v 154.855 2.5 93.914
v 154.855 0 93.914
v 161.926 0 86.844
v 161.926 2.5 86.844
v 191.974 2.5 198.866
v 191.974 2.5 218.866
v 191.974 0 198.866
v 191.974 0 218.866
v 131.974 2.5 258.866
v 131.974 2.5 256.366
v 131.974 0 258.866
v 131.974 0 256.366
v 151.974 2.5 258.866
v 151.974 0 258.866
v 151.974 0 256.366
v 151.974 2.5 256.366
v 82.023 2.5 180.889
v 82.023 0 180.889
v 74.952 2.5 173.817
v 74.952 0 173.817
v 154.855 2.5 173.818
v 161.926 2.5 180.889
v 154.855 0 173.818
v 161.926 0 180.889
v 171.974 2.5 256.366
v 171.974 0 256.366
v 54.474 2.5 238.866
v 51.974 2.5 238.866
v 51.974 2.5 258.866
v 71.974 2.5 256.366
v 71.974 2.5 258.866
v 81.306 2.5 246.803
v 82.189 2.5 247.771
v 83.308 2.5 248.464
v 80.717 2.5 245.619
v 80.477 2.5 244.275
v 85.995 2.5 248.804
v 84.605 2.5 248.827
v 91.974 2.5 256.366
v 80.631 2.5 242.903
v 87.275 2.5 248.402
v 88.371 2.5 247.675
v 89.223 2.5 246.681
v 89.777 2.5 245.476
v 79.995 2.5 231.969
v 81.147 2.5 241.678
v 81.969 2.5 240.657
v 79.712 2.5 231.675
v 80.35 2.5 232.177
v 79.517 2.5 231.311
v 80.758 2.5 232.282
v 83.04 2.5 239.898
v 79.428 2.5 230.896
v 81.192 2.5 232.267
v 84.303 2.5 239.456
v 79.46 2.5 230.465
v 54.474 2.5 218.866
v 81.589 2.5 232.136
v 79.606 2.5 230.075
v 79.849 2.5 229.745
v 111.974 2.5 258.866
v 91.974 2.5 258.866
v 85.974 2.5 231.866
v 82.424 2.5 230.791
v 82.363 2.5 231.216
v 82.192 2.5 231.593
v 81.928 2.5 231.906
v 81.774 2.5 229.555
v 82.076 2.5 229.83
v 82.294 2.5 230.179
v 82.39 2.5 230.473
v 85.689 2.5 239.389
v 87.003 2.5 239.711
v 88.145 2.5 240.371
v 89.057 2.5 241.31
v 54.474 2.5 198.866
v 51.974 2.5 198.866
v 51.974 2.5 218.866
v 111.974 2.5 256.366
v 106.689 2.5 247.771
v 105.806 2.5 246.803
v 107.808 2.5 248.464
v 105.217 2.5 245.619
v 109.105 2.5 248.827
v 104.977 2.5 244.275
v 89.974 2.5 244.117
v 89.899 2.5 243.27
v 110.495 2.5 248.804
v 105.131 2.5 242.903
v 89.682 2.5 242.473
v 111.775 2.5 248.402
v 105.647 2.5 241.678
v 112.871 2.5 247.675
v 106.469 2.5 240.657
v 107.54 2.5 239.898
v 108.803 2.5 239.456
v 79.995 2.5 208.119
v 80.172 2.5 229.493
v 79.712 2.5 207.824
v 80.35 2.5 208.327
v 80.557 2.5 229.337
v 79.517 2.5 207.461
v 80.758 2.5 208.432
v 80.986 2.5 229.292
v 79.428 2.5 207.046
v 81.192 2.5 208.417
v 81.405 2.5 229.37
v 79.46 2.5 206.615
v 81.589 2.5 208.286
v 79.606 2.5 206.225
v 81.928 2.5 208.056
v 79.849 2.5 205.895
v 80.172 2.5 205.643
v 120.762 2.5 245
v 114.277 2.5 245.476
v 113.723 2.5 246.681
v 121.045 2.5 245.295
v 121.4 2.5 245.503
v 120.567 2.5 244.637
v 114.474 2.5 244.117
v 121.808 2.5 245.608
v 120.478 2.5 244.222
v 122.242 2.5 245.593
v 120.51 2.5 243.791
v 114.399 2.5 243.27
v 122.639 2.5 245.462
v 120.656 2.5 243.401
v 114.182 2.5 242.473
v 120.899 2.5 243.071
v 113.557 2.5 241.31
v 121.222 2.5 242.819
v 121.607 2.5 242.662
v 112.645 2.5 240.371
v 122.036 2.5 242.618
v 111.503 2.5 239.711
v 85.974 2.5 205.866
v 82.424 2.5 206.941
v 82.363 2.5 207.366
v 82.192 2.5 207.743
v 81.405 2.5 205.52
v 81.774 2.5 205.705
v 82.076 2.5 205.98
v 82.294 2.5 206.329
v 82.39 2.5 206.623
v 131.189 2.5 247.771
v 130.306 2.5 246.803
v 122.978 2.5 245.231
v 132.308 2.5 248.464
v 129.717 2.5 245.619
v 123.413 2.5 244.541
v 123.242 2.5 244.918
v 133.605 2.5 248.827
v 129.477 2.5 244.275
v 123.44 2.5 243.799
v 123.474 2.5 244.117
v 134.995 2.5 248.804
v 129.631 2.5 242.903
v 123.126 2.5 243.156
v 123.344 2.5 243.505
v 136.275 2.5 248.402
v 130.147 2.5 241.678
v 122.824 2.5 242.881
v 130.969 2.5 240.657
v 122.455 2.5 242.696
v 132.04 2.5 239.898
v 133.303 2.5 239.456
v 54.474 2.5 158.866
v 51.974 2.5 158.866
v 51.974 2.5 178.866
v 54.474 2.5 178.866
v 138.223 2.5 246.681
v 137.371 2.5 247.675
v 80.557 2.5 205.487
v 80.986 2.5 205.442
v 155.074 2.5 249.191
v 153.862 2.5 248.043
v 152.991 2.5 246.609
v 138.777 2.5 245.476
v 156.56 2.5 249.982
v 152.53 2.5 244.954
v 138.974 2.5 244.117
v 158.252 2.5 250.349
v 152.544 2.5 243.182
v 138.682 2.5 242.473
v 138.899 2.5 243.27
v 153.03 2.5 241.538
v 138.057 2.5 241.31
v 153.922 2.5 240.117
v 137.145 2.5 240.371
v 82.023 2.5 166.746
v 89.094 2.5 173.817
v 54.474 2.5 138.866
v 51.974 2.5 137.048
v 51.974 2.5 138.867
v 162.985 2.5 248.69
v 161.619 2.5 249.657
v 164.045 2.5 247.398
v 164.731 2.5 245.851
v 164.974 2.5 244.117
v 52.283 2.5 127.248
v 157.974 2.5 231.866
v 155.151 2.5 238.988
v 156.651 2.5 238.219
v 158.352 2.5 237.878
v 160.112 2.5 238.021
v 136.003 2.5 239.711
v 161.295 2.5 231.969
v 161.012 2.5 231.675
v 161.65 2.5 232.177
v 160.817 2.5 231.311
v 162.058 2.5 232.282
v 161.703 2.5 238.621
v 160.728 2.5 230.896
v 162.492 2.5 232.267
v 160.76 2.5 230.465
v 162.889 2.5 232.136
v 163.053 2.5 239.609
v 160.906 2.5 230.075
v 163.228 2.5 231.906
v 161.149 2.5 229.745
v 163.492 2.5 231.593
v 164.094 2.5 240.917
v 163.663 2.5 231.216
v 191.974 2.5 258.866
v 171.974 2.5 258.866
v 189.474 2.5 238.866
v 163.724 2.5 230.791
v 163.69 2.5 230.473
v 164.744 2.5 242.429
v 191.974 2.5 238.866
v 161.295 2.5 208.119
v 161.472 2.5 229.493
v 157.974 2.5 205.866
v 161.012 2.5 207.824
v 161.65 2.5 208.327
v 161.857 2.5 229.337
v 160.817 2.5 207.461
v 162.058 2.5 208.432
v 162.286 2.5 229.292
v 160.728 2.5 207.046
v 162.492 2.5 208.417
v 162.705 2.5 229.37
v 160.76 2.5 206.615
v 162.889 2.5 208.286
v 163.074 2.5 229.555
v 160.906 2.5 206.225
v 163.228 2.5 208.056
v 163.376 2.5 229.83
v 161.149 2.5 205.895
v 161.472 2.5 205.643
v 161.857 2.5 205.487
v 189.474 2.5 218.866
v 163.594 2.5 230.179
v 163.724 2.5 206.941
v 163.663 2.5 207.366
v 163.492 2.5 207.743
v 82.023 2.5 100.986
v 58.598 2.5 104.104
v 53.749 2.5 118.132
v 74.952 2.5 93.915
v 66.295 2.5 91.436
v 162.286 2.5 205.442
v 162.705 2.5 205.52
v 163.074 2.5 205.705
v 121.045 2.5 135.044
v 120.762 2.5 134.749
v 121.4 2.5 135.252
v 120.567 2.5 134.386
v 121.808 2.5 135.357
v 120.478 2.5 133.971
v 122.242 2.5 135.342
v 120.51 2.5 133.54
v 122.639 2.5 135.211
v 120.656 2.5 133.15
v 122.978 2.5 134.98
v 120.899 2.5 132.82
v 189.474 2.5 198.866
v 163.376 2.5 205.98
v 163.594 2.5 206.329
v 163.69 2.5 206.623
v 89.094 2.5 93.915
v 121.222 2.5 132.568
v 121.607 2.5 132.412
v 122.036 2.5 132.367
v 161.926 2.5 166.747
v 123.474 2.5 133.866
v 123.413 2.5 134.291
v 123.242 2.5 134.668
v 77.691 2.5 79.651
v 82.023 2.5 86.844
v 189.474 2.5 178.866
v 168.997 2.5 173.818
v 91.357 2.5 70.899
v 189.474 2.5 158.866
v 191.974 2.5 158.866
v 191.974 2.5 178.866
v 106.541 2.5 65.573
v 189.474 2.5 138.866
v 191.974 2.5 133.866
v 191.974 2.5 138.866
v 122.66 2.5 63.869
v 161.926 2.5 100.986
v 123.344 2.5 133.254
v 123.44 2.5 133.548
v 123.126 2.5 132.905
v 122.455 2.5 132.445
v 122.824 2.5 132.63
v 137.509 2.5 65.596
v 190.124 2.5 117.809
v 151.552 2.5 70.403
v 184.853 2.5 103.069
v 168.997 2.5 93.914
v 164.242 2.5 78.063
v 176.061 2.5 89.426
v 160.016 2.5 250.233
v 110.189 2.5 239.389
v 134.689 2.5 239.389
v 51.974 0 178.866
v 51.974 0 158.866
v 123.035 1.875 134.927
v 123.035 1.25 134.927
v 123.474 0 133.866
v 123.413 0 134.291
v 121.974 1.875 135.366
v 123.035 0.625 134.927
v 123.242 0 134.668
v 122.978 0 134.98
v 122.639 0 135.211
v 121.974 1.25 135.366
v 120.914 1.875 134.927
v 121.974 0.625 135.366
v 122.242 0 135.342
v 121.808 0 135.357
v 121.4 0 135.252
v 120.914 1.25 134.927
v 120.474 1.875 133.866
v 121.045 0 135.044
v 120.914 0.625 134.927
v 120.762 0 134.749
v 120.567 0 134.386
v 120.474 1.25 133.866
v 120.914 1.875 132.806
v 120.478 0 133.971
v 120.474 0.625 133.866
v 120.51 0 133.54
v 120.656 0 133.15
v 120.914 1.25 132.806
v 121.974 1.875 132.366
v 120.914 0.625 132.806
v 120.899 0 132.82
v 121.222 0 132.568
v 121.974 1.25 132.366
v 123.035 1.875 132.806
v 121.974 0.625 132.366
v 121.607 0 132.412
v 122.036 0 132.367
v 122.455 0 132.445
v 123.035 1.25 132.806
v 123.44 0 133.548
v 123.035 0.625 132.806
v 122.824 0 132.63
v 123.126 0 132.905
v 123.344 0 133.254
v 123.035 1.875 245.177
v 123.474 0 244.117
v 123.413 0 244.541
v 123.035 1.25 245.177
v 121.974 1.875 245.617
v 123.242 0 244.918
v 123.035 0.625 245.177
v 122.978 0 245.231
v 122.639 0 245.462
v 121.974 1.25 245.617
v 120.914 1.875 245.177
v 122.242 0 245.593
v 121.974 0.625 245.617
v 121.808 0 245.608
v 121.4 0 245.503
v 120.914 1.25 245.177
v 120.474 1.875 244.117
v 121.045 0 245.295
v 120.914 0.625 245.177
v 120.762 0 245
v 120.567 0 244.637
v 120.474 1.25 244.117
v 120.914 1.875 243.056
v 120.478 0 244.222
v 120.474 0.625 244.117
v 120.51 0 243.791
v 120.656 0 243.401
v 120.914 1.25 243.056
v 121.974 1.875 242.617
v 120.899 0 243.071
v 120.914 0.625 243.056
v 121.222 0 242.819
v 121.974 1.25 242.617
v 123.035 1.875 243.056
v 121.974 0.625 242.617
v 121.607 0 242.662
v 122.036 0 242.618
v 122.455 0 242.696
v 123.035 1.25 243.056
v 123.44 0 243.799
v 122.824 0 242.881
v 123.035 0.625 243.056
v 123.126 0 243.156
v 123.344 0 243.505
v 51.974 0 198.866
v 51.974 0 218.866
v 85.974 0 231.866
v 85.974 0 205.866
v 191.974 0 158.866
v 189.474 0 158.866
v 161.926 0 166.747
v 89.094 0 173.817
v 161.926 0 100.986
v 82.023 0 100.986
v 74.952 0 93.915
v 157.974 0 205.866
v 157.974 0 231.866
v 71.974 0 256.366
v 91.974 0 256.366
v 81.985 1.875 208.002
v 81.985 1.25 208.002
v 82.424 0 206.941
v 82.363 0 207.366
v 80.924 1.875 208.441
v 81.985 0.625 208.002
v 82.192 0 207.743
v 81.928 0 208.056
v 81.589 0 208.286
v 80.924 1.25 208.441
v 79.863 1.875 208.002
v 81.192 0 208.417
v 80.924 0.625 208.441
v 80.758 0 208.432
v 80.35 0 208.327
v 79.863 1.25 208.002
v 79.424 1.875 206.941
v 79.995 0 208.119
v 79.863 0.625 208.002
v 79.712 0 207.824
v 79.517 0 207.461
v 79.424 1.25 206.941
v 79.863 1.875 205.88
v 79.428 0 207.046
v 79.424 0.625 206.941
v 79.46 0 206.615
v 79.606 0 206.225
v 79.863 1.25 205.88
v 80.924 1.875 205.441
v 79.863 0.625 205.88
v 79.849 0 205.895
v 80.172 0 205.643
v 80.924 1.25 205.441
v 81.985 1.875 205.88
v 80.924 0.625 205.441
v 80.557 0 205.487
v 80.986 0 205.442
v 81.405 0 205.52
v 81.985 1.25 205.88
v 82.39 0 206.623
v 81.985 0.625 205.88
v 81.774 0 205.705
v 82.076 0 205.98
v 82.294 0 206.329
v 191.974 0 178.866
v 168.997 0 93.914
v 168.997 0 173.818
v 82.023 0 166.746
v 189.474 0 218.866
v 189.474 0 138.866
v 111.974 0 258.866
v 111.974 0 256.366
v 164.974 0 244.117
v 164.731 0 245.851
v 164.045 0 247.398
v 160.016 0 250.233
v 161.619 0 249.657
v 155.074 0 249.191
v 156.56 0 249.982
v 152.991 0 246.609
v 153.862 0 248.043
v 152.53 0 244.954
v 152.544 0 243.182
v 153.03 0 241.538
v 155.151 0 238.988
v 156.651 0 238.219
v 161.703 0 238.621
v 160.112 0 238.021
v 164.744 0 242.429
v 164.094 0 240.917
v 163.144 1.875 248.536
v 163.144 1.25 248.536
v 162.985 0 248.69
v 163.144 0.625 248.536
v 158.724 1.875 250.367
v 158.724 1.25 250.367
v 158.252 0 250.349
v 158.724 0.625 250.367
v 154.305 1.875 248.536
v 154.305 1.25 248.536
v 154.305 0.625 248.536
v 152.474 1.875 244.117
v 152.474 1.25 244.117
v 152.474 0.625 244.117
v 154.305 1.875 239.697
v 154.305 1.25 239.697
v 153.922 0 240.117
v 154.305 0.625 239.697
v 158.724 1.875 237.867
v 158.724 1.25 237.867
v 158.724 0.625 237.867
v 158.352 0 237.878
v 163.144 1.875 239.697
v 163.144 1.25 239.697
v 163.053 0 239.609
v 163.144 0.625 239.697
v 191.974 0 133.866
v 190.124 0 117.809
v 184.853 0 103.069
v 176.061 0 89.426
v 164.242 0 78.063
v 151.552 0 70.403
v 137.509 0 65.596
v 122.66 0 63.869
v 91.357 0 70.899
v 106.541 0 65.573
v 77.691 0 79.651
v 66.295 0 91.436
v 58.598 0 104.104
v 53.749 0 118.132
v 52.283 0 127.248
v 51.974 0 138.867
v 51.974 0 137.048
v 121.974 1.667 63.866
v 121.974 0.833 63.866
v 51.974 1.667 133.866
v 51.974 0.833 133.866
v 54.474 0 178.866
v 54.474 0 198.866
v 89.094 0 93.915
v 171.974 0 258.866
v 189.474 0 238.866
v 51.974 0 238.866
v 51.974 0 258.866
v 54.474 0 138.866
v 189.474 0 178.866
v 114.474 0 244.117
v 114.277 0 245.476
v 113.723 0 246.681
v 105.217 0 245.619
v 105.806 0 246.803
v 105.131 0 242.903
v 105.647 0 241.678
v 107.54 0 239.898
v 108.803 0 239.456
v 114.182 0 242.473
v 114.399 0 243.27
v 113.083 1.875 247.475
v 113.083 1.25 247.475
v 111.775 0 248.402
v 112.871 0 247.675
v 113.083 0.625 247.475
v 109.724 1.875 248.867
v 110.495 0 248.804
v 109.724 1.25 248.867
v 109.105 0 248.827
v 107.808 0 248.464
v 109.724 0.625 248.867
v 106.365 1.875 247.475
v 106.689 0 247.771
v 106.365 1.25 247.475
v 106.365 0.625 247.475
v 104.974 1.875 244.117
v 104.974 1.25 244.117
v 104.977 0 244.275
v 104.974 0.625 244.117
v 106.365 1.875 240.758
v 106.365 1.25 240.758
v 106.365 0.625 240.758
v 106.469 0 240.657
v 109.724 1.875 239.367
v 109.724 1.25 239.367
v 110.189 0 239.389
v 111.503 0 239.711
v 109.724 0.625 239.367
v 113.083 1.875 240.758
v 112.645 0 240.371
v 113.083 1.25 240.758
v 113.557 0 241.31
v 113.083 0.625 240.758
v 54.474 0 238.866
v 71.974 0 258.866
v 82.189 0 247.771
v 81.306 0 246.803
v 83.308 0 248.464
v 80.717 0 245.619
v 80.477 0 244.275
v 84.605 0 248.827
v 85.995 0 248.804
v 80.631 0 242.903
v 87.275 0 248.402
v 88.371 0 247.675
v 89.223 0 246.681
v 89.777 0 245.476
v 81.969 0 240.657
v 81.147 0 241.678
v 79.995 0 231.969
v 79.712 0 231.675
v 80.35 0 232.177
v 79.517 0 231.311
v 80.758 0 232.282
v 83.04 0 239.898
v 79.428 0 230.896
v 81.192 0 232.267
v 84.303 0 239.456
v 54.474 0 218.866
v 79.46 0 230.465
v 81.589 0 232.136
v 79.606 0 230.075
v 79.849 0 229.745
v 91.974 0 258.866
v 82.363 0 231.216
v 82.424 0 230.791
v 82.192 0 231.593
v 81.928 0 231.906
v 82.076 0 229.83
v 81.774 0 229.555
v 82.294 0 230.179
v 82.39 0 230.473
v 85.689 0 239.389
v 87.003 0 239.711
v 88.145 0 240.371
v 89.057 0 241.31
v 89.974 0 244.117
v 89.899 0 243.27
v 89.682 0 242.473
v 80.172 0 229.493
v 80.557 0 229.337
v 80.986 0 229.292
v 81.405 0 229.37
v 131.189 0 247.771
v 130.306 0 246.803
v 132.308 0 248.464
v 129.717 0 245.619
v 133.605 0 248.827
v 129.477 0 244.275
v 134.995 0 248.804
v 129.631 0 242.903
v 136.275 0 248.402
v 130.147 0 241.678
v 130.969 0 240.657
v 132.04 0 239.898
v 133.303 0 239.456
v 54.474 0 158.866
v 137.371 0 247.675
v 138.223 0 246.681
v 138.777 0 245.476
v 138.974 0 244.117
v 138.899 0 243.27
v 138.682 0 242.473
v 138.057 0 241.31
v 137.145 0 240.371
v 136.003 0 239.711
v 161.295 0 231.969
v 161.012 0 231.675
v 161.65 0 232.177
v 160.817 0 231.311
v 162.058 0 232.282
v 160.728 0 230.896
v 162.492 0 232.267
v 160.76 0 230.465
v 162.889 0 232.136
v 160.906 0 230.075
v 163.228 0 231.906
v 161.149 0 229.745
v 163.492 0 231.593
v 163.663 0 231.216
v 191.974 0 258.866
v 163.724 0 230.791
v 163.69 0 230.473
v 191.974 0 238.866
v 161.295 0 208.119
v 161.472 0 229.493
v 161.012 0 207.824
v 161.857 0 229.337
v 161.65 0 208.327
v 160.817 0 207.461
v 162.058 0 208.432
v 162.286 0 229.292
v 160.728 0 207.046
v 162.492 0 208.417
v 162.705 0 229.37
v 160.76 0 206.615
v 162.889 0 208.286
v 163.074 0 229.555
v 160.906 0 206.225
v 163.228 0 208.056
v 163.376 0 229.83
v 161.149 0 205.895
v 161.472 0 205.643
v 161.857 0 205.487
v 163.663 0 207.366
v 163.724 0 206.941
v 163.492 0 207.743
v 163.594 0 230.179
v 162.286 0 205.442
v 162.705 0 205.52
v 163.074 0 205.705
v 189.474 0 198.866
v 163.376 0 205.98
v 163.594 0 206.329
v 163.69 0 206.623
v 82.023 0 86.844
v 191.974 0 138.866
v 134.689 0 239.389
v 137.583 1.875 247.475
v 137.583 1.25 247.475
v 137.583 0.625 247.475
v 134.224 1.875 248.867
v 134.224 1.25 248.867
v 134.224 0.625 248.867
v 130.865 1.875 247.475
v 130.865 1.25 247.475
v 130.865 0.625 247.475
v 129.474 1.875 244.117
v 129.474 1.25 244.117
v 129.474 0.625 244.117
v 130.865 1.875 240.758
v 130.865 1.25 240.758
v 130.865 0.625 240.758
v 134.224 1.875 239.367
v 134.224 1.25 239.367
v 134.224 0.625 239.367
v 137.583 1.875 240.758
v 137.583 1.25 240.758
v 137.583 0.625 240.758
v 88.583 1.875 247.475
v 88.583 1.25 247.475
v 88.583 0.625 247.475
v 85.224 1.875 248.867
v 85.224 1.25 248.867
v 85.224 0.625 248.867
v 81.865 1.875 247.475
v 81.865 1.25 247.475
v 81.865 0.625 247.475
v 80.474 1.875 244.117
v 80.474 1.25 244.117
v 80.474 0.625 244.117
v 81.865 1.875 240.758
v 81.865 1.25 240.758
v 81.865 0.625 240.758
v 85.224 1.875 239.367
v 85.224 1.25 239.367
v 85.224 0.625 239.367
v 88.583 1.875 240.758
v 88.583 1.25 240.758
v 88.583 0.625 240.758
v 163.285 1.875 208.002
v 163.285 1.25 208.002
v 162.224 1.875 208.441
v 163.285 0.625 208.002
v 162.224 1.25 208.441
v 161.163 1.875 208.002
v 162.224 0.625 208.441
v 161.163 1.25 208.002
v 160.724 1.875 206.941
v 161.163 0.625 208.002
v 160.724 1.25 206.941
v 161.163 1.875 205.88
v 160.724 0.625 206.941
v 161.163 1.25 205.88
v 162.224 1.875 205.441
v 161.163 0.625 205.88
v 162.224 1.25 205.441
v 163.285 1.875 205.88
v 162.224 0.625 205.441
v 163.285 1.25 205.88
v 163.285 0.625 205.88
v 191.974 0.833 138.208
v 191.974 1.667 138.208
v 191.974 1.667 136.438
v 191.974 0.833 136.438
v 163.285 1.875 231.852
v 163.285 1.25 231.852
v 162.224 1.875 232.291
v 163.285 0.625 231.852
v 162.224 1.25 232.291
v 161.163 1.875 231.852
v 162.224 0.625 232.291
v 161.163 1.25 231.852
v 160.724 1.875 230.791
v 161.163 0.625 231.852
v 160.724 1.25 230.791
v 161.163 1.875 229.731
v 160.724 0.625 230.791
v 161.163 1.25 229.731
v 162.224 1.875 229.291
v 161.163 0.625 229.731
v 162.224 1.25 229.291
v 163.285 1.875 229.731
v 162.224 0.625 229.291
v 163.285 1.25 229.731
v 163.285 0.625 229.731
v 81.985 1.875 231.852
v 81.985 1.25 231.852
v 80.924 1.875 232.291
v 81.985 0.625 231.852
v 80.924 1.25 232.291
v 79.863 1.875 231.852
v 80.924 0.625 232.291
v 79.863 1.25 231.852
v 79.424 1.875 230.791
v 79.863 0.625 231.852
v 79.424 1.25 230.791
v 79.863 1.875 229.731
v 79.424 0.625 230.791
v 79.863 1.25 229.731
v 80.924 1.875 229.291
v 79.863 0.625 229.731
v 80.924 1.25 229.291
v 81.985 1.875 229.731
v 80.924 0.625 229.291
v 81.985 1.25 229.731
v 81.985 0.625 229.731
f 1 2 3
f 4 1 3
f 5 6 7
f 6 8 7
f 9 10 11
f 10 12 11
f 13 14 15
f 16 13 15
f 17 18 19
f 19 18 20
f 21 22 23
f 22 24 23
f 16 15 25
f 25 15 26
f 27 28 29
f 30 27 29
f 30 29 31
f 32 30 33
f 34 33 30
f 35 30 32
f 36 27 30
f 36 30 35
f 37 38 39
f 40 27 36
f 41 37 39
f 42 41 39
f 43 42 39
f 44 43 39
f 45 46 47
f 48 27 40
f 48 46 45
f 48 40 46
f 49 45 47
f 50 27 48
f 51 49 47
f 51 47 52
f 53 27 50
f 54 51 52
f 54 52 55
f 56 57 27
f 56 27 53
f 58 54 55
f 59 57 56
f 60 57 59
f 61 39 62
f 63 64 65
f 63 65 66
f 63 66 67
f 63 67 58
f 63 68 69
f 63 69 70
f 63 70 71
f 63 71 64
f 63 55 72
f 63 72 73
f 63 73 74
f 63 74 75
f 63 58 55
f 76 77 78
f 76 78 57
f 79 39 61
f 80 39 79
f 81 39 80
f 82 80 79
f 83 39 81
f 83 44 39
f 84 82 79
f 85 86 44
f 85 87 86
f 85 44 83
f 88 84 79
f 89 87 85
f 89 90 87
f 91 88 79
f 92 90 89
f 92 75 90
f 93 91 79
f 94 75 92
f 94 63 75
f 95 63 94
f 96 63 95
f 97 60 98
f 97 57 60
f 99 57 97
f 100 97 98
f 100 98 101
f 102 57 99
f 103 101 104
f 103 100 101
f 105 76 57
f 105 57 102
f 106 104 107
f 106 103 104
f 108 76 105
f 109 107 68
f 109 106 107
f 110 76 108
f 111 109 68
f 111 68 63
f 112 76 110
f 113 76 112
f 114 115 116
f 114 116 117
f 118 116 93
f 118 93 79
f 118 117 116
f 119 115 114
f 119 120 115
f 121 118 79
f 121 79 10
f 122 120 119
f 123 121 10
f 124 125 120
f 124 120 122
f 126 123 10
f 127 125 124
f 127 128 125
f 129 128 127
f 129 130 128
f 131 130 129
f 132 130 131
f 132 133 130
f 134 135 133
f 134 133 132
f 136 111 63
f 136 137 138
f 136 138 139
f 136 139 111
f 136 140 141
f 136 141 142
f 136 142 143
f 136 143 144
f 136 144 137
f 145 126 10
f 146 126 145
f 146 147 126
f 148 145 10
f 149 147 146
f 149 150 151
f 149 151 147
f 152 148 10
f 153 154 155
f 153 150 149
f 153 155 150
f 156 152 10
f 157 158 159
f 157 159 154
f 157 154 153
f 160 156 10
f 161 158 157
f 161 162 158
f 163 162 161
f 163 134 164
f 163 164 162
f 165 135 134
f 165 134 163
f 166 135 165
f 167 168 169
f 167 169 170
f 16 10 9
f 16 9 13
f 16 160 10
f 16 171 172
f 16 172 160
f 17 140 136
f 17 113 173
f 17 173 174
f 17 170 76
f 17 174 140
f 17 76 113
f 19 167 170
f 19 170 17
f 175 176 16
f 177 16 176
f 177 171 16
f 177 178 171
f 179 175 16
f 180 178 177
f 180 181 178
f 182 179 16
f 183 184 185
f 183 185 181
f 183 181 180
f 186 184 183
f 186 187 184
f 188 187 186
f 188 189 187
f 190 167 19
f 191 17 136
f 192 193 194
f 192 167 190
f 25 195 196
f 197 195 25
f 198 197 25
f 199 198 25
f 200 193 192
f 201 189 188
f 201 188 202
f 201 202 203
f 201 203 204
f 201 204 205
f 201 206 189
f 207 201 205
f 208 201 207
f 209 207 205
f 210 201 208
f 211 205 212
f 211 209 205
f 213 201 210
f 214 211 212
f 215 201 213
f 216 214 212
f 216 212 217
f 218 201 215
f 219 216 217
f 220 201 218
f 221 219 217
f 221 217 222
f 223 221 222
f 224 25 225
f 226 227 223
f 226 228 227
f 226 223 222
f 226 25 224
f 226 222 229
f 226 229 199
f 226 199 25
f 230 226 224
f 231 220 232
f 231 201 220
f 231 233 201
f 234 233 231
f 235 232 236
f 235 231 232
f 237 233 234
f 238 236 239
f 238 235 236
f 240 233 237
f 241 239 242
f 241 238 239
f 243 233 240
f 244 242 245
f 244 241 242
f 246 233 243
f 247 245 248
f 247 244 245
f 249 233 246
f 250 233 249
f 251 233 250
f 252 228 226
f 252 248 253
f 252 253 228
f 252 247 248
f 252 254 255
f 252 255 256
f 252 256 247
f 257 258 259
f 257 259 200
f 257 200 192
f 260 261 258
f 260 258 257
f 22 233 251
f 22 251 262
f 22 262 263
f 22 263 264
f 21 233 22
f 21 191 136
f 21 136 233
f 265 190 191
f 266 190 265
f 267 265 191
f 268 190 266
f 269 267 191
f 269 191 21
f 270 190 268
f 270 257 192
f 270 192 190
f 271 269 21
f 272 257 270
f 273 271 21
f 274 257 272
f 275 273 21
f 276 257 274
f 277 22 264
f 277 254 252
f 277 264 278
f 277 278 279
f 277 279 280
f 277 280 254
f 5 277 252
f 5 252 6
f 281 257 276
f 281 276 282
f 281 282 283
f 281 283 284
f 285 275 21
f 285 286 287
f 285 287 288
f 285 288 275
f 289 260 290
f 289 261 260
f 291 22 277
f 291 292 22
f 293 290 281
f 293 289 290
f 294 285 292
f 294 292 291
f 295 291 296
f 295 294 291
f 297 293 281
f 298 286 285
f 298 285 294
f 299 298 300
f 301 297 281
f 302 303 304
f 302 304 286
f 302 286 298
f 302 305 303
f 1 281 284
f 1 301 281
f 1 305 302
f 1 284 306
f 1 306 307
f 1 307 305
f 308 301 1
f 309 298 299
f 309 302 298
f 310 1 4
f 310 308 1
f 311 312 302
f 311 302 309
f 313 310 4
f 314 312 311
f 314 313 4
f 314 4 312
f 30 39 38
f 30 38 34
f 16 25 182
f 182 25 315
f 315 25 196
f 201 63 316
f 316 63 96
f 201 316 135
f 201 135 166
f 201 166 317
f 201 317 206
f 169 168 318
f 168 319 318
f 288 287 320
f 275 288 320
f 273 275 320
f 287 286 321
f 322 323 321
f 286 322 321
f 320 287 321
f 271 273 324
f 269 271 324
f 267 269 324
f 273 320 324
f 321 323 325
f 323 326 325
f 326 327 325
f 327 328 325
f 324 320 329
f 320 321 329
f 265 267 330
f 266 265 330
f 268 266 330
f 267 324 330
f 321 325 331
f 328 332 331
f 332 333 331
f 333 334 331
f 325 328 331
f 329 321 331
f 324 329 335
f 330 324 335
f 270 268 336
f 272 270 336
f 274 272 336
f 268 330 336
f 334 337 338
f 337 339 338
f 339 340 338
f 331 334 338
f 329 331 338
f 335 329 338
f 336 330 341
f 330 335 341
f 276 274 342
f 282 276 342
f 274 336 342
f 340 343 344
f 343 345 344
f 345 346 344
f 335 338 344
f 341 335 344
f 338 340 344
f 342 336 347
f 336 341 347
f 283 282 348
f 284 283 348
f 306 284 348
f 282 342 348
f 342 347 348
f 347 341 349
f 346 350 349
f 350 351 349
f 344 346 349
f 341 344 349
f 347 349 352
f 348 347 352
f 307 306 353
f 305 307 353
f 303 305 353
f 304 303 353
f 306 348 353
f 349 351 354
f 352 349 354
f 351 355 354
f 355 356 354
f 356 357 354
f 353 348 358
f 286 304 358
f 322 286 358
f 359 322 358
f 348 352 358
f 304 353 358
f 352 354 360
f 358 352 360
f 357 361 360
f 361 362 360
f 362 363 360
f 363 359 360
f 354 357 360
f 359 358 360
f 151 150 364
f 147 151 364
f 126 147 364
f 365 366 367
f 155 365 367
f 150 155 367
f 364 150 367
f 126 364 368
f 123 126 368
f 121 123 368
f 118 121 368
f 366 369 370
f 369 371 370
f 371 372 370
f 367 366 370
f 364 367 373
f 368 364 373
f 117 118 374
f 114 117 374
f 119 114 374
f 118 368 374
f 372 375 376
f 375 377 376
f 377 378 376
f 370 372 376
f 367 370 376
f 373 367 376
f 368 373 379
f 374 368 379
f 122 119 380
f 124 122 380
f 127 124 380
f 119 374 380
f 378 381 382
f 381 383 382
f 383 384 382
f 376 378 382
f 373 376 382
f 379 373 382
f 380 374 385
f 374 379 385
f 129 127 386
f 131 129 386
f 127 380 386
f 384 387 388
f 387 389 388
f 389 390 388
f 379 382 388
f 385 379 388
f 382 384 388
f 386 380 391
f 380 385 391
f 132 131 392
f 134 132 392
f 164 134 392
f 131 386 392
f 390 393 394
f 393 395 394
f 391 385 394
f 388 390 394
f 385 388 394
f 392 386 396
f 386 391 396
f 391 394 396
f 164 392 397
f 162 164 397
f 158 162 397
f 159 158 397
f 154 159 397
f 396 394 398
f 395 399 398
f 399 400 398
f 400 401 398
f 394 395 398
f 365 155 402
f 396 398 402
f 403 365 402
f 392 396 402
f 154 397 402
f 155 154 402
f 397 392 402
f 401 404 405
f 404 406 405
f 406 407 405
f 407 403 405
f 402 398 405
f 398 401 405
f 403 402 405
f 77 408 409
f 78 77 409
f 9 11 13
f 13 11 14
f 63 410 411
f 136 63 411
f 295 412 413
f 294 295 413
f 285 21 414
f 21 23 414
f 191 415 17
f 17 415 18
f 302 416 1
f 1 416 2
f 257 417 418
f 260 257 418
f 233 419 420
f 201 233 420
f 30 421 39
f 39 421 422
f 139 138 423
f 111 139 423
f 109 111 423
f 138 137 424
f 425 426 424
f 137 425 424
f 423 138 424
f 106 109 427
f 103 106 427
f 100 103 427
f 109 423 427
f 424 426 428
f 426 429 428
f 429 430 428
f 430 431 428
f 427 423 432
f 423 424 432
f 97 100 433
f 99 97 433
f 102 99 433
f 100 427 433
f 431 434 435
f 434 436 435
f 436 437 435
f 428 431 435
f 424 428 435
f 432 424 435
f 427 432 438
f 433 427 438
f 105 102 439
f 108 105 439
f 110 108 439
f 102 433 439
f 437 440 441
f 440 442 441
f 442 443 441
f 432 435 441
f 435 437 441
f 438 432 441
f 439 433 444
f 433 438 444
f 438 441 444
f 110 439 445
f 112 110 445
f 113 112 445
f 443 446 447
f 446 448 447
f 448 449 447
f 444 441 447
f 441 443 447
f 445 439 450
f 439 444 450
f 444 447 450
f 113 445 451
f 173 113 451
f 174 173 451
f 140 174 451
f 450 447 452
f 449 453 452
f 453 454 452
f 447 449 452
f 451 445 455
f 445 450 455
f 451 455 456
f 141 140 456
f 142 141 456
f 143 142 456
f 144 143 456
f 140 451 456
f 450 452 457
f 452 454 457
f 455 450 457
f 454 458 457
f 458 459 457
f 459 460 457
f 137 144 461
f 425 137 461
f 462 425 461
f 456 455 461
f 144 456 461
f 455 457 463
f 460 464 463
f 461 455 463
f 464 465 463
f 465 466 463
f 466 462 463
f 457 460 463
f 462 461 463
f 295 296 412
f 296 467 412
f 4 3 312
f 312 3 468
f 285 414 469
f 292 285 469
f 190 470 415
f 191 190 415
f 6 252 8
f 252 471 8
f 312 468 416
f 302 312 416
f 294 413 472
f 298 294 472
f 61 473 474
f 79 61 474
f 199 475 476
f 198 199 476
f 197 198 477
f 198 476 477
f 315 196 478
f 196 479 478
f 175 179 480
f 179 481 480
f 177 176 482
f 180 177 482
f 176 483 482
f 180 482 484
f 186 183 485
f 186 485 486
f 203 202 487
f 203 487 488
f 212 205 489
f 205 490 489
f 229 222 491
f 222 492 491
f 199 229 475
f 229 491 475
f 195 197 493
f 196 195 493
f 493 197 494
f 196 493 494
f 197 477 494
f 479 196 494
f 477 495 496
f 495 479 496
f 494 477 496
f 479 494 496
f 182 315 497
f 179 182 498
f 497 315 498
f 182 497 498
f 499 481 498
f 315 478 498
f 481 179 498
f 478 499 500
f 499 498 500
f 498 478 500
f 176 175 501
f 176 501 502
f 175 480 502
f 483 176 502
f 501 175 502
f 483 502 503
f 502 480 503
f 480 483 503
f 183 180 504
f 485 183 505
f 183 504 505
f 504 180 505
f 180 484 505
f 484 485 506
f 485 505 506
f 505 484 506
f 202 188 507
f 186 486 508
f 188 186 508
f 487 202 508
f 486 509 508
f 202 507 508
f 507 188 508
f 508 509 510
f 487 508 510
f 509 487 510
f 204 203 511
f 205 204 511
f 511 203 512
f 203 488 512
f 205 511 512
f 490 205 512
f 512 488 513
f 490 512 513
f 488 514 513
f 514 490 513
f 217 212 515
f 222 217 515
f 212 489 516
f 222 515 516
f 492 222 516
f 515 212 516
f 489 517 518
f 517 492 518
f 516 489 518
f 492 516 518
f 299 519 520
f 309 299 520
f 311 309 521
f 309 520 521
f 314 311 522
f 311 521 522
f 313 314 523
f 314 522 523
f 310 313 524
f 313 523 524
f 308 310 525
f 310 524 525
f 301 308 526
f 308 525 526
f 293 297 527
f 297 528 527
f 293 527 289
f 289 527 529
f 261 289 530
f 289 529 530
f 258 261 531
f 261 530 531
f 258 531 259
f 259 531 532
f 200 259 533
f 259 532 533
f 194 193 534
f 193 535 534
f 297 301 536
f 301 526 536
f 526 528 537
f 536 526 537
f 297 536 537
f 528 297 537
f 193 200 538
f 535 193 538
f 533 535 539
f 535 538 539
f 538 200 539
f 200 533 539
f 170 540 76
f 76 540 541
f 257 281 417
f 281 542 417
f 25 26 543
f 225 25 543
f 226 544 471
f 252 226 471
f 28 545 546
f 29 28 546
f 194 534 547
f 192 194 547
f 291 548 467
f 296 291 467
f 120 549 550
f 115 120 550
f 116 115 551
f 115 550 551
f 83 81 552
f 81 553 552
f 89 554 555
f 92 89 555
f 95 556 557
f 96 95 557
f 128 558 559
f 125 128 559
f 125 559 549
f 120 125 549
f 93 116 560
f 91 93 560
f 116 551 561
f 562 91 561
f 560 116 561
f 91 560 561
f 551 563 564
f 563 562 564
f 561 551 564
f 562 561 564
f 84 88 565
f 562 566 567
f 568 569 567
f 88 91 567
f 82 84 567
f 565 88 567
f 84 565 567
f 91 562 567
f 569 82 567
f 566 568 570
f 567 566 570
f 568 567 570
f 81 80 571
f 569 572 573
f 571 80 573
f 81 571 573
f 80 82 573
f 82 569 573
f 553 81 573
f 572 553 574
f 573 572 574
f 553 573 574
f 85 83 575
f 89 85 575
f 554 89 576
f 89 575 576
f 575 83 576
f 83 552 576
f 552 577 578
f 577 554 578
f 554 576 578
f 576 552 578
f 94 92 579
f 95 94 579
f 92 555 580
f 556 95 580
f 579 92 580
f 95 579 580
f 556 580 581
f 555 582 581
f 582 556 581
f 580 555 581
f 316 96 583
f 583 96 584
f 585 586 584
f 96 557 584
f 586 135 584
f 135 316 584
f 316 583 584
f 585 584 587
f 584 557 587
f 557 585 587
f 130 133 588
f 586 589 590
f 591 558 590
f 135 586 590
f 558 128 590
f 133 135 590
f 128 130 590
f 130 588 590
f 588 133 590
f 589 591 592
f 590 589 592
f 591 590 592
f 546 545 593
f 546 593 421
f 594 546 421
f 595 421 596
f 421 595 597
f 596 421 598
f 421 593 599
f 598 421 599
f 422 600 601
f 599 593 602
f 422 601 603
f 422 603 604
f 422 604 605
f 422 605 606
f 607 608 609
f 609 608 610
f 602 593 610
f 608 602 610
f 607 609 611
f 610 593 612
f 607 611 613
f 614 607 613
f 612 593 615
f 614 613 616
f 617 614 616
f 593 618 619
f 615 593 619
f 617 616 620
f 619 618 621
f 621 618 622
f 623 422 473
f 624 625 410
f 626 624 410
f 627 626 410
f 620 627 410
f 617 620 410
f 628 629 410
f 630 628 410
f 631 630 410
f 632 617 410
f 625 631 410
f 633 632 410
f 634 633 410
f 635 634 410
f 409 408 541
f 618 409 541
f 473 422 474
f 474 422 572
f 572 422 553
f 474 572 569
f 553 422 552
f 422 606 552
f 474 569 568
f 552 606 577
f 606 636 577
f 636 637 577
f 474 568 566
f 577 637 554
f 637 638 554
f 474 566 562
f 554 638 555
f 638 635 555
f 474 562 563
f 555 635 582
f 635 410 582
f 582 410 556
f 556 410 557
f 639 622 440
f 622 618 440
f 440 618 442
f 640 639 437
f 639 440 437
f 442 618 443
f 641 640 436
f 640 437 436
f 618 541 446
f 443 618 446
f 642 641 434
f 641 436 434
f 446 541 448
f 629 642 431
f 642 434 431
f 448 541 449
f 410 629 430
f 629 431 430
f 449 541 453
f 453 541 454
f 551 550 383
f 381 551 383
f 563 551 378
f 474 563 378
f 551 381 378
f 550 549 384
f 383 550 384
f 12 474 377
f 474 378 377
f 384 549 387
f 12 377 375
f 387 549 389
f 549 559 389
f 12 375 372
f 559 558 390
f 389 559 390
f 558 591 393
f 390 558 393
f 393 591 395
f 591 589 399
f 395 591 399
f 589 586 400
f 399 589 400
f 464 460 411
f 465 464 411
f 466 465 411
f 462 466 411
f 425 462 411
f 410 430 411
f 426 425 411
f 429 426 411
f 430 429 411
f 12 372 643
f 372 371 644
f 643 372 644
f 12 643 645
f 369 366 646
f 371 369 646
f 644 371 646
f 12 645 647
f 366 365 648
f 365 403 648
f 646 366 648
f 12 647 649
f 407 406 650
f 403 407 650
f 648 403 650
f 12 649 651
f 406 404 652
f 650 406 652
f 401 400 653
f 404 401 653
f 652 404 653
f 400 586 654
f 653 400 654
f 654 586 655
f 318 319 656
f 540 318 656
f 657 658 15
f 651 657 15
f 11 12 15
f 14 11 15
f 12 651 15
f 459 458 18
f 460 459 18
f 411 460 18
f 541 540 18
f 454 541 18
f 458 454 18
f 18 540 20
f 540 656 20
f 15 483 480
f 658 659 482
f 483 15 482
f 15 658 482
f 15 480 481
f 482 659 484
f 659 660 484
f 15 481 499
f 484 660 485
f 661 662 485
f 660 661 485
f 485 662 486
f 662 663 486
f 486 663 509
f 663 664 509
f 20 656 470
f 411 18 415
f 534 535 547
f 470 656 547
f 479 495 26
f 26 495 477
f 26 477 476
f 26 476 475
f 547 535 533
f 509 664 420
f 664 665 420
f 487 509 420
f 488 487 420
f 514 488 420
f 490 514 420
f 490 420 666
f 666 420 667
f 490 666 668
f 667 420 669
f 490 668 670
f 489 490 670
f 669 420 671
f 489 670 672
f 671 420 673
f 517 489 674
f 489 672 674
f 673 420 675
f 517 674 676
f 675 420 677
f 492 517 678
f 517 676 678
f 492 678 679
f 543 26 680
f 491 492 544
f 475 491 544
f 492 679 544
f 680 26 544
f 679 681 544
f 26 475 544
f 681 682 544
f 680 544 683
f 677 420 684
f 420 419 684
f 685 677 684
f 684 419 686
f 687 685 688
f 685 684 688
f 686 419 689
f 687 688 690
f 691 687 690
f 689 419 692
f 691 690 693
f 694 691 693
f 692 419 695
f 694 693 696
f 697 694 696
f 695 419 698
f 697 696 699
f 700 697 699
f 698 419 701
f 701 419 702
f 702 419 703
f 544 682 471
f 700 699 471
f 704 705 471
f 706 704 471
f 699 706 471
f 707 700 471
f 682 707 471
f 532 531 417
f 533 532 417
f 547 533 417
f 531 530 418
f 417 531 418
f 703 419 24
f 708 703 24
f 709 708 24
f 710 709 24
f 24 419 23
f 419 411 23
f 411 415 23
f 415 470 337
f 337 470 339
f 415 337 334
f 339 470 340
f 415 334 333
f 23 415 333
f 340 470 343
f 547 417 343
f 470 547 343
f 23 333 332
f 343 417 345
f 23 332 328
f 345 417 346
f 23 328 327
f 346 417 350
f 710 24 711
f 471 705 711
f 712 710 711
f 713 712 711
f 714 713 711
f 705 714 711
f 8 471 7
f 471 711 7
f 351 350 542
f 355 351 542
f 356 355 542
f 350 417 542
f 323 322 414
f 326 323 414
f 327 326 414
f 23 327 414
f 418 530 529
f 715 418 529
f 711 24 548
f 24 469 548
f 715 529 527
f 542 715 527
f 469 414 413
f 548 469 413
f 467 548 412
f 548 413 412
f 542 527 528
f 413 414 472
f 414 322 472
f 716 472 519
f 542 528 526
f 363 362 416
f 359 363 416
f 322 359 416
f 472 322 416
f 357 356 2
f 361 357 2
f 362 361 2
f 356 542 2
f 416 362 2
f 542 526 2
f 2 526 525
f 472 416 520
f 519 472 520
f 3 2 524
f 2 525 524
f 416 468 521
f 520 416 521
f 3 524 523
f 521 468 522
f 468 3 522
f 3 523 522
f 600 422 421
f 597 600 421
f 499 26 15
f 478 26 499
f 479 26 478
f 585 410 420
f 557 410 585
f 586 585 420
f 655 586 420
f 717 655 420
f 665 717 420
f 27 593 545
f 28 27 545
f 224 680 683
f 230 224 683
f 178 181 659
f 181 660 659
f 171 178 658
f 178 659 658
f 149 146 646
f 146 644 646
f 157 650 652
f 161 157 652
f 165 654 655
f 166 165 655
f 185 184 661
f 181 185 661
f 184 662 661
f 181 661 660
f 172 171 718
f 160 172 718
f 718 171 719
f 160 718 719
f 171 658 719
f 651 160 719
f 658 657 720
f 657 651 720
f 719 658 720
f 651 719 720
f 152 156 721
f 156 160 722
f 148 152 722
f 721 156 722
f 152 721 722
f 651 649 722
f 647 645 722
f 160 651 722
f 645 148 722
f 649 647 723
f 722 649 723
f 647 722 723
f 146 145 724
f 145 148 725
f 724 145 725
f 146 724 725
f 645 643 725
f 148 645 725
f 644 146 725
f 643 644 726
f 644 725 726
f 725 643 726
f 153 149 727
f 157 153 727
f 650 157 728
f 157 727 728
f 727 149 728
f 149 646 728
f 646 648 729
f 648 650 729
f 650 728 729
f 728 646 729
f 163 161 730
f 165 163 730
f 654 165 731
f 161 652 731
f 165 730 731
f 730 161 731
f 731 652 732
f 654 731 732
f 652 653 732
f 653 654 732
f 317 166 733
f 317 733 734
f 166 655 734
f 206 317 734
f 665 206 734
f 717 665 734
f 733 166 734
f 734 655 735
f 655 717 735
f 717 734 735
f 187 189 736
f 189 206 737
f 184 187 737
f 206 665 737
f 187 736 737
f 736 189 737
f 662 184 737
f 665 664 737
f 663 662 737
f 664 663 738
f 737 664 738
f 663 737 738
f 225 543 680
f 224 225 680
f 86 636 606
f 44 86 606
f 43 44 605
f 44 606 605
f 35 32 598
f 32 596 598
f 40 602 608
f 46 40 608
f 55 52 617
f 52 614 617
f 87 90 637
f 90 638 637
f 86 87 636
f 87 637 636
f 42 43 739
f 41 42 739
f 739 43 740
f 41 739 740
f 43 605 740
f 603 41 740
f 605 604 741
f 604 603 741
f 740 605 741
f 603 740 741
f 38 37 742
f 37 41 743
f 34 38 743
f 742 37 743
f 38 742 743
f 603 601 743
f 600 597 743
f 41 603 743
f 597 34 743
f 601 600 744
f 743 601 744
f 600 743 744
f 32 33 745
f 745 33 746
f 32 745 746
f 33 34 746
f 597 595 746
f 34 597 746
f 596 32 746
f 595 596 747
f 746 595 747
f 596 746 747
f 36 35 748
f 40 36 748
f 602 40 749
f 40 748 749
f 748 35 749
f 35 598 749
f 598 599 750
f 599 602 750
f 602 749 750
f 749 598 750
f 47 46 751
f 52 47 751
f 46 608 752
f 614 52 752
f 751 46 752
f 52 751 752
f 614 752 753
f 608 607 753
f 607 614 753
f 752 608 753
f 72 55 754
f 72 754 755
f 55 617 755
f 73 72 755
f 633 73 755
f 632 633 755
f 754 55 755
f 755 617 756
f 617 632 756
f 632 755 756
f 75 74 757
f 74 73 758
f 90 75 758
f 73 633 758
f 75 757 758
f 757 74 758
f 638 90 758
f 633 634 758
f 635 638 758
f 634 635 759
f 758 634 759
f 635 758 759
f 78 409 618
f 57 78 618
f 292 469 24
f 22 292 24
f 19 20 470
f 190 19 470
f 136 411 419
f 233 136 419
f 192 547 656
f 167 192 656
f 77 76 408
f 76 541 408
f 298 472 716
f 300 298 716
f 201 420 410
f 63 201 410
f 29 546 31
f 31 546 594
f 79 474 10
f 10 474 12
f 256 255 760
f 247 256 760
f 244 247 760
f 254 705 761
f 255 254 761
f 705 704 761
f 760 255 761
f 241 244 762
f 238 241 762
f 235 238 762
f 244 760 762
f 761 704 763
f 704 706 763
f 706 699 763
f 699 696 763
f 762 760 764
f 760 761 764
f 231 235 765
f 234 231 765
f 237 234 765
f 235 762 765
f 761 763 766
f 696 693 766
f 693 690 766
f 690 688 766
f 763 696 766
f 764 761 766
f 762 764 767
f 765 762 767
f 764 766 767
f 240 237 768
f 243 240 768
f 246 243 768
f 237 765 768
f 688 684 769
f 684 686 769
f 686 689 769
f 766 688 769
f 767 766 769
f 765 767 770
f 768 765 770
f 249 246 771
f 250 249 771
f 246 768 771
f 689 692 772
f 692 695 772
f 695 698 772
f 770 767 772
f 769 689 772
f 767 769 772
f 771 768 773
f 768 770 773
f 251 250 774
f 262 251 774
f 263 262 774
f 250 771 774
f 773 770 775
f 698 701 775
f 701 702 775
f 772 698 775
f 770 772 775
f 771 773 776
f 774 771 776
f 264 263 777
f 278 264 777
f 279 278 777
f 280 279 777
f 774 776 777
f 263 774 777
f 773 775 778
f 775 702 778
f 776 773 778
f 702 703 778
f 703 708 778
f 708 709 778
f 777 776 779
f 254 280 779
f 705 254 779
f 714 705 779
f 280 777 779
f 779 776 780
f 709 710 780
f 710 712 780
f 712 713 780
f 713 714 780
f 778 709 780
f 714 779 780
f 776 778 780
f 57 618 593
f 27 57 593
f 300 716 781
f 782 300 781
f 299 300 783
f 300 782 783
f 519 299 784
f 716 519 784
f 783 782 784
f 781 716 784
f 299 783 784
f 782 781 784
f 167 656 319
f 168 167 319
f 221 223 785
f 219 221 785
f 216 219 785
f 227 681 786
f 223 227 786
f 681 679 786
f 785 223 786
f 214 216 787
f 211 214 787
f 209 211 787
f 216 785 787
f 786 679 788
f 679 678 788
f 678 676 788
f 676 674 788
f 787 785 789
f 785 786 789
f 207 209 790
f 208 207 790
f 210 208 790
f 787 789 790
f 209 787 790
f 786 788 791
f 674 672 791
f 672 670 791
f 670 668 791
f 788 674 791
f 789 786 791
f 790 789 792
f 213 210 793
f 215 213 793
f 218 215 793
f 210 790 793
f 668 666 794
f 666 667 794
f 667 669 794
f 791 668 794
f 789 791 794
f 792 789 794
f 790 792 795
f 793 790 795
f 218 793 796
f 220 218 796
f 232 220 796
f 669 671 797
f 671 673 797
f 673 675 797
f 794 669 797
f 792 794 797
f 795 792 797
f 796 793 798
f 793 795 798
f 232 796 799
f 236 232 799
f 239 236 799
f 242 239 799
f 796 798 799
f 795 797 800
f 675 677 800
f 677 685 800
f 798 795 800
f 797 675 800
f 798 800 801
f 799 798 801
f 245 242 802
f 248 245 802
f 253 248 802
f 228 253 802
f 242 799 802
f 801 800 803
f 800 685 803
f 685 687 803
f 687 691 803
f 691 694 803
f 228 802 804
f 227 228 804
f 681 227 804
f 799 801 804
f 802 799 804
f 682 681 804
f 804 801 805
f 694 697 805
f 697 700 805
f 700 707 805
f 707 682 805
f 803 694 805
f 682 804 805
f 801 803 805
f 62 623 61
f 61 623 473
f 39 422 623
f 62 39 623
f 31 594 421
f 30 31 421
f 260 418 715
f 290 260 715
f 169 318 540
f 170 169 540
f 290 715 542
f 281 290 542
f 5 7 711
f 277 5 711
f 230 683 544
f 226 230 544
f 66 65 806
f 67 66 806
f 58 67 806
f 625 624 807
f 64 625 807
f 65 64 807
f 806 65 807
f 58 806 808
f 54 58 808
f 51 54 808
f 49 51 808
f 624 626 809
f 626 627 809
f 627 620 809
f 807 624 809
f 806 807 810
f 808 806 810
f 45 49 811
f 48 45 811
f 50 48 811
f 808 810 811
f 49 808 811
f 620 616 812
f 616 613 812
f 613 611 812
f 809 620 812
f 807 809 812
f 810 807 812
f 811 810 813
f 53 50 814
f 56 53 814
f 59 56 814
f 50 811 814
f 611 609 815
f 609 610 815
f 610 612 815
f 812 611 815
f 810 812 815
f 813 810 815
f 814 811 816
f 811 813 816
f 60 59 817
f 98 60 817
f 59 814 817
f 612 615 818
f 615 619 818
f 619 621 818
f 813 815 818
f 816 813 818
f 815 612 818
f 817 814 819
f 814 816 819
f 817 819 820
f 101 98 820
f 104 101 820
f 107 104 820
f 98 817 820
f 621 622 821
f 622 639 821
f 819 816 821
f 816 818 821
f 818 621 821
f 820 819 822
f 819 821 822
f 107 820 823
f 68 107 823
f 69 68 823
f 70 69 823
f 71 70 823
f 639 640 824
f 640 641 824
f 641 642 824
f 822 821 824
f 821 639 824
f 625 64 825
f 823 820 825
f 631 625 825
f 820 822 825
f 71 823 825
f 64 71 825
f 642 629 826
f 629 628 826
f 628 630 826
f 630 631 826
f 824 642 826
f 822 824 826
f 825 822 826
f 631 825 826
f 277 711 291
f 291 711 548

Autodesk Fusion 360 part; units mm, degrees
sketch "スケッチ1" plane through (0, 0, 0) normal (0, 1, 0) x (1, 0, 0)
  line L0 (74.9515, -173.8172) -> (82.0226, -166.7463)
  line L1 (82.0226, -180.8886) -> (74.9515, -173.8172)
  line L2 (168.9969, -173.8176) -> (161.9258, -180.889)
  line L3 (161.9258, -166.7467) -> (168.9969, -173.8176)
  line L4 (85.9741, -205.8663) -> (157.9741, -205.8663)
  line L5 (74.9515, -93.9147) -> (82.0226, -86.8439)
  line L6 (191.9739, -258.8664) -> (191.9739, -238.8662)
  line L7 (191.9739, -238.8662) -> (189.4742, -238.8662)
  line L8 (189.4742, -238.8662) -> (189.4742, -218.8664)
  line L9 (189.4742, -218.8664) -> (191.9739, -218.8664)
  line L10 (191.9739, -218.8664) -> (191.9739, -198.8665)
  line L11 (191.9739, -198.8665) -> (189.4742, -198.8665)
  line L12 (189.4742, -198.8665) -> (189.4742, -178.8664)
  line L13 (189.4742, -178.8664) -> (191.9739, -178.8664)
  line L14 (191.9739, -178.8664) -> (191.9739, -158.8662)
  line L15 (191.9739, -158.8662) -> (189.4742, -158.8662)
  line L16 (189.4742, -158.8662) -> (189.4742, -138.8664)
  line L17 (189.4742, -138.8664) -> (191.9739, -138.8664)
  spline S0 degree 3 poles (191.9739, -138.8664) (191.9739, -138.8663) (191.9739, -136.7363) (191.9743, -133.8662) knots 12 12 12 12 13 13 13 13
  spline S1 degree 3 poles (191.9743, -133.8662) (191.9743, -95.2061) (160.6342, -63.8661) (121.974, -63.8661) (83.3142, -63.8661) (51.9741, -95.2061) (51.9741, -133.8662) (51.9741, -136.7363) (51.9741, -138.8665) (51.9741, -138.8666) knots 13 13 13 13 14 14 14 15 15 15 16 16 16 16
  line L18 (51.9741, -138.8666) -> (54.4739, -138.8664)
  line L19 (54.4739, -138.8664) -> (54.4739, -158.8662)
  line L20 (54.4739, -158.8662) -> (51.9741, -158.8662)
  line L21 (51.9741, -158.8662) -> (51.9741, -178.8664)
  line L22 (51.9741, -178.8664) -> (54.4739, -178.8664)
  line L23 (54.4739, -178.8664) -> (54.4739, -198.8665)
  line L24 (54.4739, -198.8665) -> (51.9741, -198.8665)
  line L25 (51.9741, -198.8665) -> (51.9741, -218.8664)
  line L26 (51.9741, -218.8664) -> (54.4739, -218.8664)
  line L27 (54.4739, -218.8664) -> (54.4739, -238.8662)
  line L28 (54.4739, -238.8662) -> (51.9741, -238.8662)
  line L29 (51.9741, -238.8662) -> (51.9741, -258.8664)
  line L30 (51.9741, -258.8664) -> (71.9741, -258.8664)
  line L31 (71.9741, -258.8664) -> (71.9741, -256.3663)
  line L32 (71.9741, -256.3663) -> (91.9741, -256.3663)
  line L33 (91.9741, -256.3663) -> (91.9741, -258.8664)
  line L34 (91.9741, -258.8664) -> (111.9741, -258.8664)
  line L35 (111.9741, -258.8664) -> (111.9741, -256.3663)
  line L36 (111.9741, -256.3663) -> (131.9741, -256.3663)
  line L37 (131.9741, -256.3663) -> (131.9741, -258.8664)
  line L38 (131.9741, -258.8664) -> (151.9741, -258.8664)
  line L39 (151.9741, -258.8664) -> (151.9741, -256.3663)
  line L40 (151.9741, -256.3663) -> (171.9741, -256.3663)
  line L41 (171.9741, -256.3663) -> (171.9741, -258.8664)
  line L42 (171.9741, -258.8664) -> (191.9739, -258.8664)
  line L43 (89.0937, -173.8172) -> (82.0226, -180.8886)
  line L44 (161.9256, -100.9858) -> (154.8546, -93.9144)
  line L45 (161.9258, -180.889) -> (154.8547, -173.8176)
  line L46 (89.0937, -93.9147) -> (82.0226, -100.9862)
  spline S2 degree 3 poles (123.4742, -244.1169) (123.4742, -244.9451) (122.8026, -245.6169) (121.9742, -245.6169) (121.1458, -245.6169) (120.4742, -244.9451) (120.4742, -244.1169) (120.4742, -243.2887) (121.1458, -242.6169) (121.9742, -242.6169) (122.8026, -242.6169) (123.4742, -243.2887) (123.4742, -244.1169) knots 0 0 0 0 1 1 1 2 2 2 3 3 3 4 4 4 4
  line L47 (161.9256, -86.8435) -> (168.9967, -93.9144)
  line L48 (82.0226, -86.8439) -> (89.0937, -93.9147)
  line L49 (168.9967, -93.9144) -> (161.9256, -100.9858)
  line L50 (154.8546, -93.9144) -> (161.9256, -86.8435)
  spline S3 degree 3 poles (123.4742, -133.8662) (123.4742, -134.6945) (122.8026, -135.3662) (121.9742, -135.3662) (121.1458, -135.3662) (120.4742, -134.6945) (120.4742, -133.8662) (120.4742, -133.0378) (121.1458, -132.3662) (121.9742, -132.3662) (122.8026, -132.3662) (123.4742, -133.0378) (123.4742, -133.8662) knots 0 0 0 0 1 1 1 2 2 2 3 3 3 4 4 4 4
  line L51 (82.0226, -166.7463) -> (89.0937, -173.8172)
  line L52 (82.0226, -100.9862) -> (74.9515, -93.9147)
  line L53 (154.8547, -173.8176) -> (161.9258, -166.7467)
  spline S4 degree 3 poles (164.9744, -244.1169) (164.9744, -247.5685) (162.1761, -250.3666) (158.7243, -250.3666) (155.2726, -250.3666) (152.4743, -247.5685) (152.4743, -244.1169) (152.4743, -240.6649) (155.2726, -237.8668) (158.7243, -237.8668) (162.1761, -237.8668) (164.9744, -240.6649) (164.9744, -244.1169) knots 0 0 0 0 1 1 1 2 2 2 3 3 3 4 4 4 4
  spline S5 degree 3 poles (114.4742, -244.1169) (114.4742, -246.74) (112.3476, -248.8666) (109.7241, -248.8666) (107.1009, -248.8666) (104.9742, -246.74) (104.9742, -244.1169) (104.9742, -241.4934) (107.1009, -239.3668) (109.7241, -239.3668) (112.3476, -239.3668) (114.4742, -241.4934) (114.4742, -244.1169) knots 0 0 0 0 1 1 1 2 2 2 3 3 3 4 4 4 4
  spline S6 degree 3 poles (163.7241, -230.7912) (163.7241, -231.6198) (163.0525, -232.2912) (162.2241, -232.2912) (161.3958, -232.2912) (160.7241, -231.6198) (160.7241, -230.7912) (160.7241, -229.9627) (161.3958, -229.2912) (162.2241, -229.2912) (163.0525, -229.2912) (163.7241, -229.9627) (163.7241, -230.7912) knots 0 0 0 0 1 1 1 2 2 2 3 3 3 4 4 4 4
  spline S7 degree 3 poles (89.9742, -244.1169) (89.9742, -246.74) (87.8476, -248.8666) (85.2241, -248.8666) (82.6009, -248.8666) (80.4742, -246.74) (80.4742, -244.1169) (80.4742, -241.4934) (82.6009, -239.3668) (85.2241, -239.3668) (87.8476, -239.3668) (89.9742, -241.4934) (89.9742, -244.1169) knots 0 0 0 0 1 1 1 2 2 2 3 3 3 4 4 4 4
  spline S8 degree 3 poles (163.7241, -206.9412) (163.7241, -207.7697) (163.0525, -208.4412) (162.2241, -208.4412) (161.3958, -208.4412) (160.7241, -207.7697) (160.7241, -206.9412) (160.7241, -206.1126) (161.3958, -205.4412) (162.2241, -205.4412) (163.0525, -205.4412) (163.7241, -206.1126) (163.7241, -206.9412) knots 0 0 0 0 1 1 1 2 2 2 3 3 3 4 4 4 4
  line L54 (85.9741, -231.8664) -> (85.9741, -205.8663)
  line L55 (157.9741, -231.8664) -> (85.9741, -231.8664)
  spline S9 degree 3 poles (82.4241, -230.7912) (82.4241, -231.6198) (81.7525, -232.2912) (80.9241, -232.2912) (80.0958, -232.2912) (79.4241, -231.6198) (79.4241, -230.7912) (79.4241, -229.9627) (80.0958, -229.2912) (80.9241, -229.2912) (81.7525, -229.2912) (82.4241, -229.9627) (82.4241, -230.7912) knots 0 0 0 0 1 1 1 2 2 2 3 3 3 4 4 4 4
  spline S10 degree 3 poles (82.4241, -206.9412) (82.4241, -207.7697) (81.7525, -208.4412) (80.9241, -208.4412) (80.0958, -208.4412) (79.4241, -207.7697) (79.4241, -206.9412) (79.4241, -206.1126) (80.0958, -205.4412) (80.9241, -205.4412) (81.7525, -205.4412) (82.4241, -206.1126) (82.4241, -206.9412) knots 0 0 0 0 1 1 1 2 2 2 3 3 3 4 4 4 4
  line L56 (157.9741, -205.8663) -> (157.9741, -231.8664)
  spline S11 degree 3 poles (138.9742, -244.1169) (138.9742, -246.74) (136.8476, -248.8666) (134.2241, -248.8666) (131.6008, -248.8666) (129.4742, -246.74) (129.4742, -244.1169) (129.4742, -241.4934) (131.6008, -239.3668) (134.2241, -239.3668) (136.8476, -239.3668) (138.9742, -241.4934) (138.9742, -244.1169) knots 0 0 0 0 1 1 1 2 2 2 3 3 3 4 4 4 4
extrude "押し出し1" add sketch "スケッチ1" along normal blind 2.5
